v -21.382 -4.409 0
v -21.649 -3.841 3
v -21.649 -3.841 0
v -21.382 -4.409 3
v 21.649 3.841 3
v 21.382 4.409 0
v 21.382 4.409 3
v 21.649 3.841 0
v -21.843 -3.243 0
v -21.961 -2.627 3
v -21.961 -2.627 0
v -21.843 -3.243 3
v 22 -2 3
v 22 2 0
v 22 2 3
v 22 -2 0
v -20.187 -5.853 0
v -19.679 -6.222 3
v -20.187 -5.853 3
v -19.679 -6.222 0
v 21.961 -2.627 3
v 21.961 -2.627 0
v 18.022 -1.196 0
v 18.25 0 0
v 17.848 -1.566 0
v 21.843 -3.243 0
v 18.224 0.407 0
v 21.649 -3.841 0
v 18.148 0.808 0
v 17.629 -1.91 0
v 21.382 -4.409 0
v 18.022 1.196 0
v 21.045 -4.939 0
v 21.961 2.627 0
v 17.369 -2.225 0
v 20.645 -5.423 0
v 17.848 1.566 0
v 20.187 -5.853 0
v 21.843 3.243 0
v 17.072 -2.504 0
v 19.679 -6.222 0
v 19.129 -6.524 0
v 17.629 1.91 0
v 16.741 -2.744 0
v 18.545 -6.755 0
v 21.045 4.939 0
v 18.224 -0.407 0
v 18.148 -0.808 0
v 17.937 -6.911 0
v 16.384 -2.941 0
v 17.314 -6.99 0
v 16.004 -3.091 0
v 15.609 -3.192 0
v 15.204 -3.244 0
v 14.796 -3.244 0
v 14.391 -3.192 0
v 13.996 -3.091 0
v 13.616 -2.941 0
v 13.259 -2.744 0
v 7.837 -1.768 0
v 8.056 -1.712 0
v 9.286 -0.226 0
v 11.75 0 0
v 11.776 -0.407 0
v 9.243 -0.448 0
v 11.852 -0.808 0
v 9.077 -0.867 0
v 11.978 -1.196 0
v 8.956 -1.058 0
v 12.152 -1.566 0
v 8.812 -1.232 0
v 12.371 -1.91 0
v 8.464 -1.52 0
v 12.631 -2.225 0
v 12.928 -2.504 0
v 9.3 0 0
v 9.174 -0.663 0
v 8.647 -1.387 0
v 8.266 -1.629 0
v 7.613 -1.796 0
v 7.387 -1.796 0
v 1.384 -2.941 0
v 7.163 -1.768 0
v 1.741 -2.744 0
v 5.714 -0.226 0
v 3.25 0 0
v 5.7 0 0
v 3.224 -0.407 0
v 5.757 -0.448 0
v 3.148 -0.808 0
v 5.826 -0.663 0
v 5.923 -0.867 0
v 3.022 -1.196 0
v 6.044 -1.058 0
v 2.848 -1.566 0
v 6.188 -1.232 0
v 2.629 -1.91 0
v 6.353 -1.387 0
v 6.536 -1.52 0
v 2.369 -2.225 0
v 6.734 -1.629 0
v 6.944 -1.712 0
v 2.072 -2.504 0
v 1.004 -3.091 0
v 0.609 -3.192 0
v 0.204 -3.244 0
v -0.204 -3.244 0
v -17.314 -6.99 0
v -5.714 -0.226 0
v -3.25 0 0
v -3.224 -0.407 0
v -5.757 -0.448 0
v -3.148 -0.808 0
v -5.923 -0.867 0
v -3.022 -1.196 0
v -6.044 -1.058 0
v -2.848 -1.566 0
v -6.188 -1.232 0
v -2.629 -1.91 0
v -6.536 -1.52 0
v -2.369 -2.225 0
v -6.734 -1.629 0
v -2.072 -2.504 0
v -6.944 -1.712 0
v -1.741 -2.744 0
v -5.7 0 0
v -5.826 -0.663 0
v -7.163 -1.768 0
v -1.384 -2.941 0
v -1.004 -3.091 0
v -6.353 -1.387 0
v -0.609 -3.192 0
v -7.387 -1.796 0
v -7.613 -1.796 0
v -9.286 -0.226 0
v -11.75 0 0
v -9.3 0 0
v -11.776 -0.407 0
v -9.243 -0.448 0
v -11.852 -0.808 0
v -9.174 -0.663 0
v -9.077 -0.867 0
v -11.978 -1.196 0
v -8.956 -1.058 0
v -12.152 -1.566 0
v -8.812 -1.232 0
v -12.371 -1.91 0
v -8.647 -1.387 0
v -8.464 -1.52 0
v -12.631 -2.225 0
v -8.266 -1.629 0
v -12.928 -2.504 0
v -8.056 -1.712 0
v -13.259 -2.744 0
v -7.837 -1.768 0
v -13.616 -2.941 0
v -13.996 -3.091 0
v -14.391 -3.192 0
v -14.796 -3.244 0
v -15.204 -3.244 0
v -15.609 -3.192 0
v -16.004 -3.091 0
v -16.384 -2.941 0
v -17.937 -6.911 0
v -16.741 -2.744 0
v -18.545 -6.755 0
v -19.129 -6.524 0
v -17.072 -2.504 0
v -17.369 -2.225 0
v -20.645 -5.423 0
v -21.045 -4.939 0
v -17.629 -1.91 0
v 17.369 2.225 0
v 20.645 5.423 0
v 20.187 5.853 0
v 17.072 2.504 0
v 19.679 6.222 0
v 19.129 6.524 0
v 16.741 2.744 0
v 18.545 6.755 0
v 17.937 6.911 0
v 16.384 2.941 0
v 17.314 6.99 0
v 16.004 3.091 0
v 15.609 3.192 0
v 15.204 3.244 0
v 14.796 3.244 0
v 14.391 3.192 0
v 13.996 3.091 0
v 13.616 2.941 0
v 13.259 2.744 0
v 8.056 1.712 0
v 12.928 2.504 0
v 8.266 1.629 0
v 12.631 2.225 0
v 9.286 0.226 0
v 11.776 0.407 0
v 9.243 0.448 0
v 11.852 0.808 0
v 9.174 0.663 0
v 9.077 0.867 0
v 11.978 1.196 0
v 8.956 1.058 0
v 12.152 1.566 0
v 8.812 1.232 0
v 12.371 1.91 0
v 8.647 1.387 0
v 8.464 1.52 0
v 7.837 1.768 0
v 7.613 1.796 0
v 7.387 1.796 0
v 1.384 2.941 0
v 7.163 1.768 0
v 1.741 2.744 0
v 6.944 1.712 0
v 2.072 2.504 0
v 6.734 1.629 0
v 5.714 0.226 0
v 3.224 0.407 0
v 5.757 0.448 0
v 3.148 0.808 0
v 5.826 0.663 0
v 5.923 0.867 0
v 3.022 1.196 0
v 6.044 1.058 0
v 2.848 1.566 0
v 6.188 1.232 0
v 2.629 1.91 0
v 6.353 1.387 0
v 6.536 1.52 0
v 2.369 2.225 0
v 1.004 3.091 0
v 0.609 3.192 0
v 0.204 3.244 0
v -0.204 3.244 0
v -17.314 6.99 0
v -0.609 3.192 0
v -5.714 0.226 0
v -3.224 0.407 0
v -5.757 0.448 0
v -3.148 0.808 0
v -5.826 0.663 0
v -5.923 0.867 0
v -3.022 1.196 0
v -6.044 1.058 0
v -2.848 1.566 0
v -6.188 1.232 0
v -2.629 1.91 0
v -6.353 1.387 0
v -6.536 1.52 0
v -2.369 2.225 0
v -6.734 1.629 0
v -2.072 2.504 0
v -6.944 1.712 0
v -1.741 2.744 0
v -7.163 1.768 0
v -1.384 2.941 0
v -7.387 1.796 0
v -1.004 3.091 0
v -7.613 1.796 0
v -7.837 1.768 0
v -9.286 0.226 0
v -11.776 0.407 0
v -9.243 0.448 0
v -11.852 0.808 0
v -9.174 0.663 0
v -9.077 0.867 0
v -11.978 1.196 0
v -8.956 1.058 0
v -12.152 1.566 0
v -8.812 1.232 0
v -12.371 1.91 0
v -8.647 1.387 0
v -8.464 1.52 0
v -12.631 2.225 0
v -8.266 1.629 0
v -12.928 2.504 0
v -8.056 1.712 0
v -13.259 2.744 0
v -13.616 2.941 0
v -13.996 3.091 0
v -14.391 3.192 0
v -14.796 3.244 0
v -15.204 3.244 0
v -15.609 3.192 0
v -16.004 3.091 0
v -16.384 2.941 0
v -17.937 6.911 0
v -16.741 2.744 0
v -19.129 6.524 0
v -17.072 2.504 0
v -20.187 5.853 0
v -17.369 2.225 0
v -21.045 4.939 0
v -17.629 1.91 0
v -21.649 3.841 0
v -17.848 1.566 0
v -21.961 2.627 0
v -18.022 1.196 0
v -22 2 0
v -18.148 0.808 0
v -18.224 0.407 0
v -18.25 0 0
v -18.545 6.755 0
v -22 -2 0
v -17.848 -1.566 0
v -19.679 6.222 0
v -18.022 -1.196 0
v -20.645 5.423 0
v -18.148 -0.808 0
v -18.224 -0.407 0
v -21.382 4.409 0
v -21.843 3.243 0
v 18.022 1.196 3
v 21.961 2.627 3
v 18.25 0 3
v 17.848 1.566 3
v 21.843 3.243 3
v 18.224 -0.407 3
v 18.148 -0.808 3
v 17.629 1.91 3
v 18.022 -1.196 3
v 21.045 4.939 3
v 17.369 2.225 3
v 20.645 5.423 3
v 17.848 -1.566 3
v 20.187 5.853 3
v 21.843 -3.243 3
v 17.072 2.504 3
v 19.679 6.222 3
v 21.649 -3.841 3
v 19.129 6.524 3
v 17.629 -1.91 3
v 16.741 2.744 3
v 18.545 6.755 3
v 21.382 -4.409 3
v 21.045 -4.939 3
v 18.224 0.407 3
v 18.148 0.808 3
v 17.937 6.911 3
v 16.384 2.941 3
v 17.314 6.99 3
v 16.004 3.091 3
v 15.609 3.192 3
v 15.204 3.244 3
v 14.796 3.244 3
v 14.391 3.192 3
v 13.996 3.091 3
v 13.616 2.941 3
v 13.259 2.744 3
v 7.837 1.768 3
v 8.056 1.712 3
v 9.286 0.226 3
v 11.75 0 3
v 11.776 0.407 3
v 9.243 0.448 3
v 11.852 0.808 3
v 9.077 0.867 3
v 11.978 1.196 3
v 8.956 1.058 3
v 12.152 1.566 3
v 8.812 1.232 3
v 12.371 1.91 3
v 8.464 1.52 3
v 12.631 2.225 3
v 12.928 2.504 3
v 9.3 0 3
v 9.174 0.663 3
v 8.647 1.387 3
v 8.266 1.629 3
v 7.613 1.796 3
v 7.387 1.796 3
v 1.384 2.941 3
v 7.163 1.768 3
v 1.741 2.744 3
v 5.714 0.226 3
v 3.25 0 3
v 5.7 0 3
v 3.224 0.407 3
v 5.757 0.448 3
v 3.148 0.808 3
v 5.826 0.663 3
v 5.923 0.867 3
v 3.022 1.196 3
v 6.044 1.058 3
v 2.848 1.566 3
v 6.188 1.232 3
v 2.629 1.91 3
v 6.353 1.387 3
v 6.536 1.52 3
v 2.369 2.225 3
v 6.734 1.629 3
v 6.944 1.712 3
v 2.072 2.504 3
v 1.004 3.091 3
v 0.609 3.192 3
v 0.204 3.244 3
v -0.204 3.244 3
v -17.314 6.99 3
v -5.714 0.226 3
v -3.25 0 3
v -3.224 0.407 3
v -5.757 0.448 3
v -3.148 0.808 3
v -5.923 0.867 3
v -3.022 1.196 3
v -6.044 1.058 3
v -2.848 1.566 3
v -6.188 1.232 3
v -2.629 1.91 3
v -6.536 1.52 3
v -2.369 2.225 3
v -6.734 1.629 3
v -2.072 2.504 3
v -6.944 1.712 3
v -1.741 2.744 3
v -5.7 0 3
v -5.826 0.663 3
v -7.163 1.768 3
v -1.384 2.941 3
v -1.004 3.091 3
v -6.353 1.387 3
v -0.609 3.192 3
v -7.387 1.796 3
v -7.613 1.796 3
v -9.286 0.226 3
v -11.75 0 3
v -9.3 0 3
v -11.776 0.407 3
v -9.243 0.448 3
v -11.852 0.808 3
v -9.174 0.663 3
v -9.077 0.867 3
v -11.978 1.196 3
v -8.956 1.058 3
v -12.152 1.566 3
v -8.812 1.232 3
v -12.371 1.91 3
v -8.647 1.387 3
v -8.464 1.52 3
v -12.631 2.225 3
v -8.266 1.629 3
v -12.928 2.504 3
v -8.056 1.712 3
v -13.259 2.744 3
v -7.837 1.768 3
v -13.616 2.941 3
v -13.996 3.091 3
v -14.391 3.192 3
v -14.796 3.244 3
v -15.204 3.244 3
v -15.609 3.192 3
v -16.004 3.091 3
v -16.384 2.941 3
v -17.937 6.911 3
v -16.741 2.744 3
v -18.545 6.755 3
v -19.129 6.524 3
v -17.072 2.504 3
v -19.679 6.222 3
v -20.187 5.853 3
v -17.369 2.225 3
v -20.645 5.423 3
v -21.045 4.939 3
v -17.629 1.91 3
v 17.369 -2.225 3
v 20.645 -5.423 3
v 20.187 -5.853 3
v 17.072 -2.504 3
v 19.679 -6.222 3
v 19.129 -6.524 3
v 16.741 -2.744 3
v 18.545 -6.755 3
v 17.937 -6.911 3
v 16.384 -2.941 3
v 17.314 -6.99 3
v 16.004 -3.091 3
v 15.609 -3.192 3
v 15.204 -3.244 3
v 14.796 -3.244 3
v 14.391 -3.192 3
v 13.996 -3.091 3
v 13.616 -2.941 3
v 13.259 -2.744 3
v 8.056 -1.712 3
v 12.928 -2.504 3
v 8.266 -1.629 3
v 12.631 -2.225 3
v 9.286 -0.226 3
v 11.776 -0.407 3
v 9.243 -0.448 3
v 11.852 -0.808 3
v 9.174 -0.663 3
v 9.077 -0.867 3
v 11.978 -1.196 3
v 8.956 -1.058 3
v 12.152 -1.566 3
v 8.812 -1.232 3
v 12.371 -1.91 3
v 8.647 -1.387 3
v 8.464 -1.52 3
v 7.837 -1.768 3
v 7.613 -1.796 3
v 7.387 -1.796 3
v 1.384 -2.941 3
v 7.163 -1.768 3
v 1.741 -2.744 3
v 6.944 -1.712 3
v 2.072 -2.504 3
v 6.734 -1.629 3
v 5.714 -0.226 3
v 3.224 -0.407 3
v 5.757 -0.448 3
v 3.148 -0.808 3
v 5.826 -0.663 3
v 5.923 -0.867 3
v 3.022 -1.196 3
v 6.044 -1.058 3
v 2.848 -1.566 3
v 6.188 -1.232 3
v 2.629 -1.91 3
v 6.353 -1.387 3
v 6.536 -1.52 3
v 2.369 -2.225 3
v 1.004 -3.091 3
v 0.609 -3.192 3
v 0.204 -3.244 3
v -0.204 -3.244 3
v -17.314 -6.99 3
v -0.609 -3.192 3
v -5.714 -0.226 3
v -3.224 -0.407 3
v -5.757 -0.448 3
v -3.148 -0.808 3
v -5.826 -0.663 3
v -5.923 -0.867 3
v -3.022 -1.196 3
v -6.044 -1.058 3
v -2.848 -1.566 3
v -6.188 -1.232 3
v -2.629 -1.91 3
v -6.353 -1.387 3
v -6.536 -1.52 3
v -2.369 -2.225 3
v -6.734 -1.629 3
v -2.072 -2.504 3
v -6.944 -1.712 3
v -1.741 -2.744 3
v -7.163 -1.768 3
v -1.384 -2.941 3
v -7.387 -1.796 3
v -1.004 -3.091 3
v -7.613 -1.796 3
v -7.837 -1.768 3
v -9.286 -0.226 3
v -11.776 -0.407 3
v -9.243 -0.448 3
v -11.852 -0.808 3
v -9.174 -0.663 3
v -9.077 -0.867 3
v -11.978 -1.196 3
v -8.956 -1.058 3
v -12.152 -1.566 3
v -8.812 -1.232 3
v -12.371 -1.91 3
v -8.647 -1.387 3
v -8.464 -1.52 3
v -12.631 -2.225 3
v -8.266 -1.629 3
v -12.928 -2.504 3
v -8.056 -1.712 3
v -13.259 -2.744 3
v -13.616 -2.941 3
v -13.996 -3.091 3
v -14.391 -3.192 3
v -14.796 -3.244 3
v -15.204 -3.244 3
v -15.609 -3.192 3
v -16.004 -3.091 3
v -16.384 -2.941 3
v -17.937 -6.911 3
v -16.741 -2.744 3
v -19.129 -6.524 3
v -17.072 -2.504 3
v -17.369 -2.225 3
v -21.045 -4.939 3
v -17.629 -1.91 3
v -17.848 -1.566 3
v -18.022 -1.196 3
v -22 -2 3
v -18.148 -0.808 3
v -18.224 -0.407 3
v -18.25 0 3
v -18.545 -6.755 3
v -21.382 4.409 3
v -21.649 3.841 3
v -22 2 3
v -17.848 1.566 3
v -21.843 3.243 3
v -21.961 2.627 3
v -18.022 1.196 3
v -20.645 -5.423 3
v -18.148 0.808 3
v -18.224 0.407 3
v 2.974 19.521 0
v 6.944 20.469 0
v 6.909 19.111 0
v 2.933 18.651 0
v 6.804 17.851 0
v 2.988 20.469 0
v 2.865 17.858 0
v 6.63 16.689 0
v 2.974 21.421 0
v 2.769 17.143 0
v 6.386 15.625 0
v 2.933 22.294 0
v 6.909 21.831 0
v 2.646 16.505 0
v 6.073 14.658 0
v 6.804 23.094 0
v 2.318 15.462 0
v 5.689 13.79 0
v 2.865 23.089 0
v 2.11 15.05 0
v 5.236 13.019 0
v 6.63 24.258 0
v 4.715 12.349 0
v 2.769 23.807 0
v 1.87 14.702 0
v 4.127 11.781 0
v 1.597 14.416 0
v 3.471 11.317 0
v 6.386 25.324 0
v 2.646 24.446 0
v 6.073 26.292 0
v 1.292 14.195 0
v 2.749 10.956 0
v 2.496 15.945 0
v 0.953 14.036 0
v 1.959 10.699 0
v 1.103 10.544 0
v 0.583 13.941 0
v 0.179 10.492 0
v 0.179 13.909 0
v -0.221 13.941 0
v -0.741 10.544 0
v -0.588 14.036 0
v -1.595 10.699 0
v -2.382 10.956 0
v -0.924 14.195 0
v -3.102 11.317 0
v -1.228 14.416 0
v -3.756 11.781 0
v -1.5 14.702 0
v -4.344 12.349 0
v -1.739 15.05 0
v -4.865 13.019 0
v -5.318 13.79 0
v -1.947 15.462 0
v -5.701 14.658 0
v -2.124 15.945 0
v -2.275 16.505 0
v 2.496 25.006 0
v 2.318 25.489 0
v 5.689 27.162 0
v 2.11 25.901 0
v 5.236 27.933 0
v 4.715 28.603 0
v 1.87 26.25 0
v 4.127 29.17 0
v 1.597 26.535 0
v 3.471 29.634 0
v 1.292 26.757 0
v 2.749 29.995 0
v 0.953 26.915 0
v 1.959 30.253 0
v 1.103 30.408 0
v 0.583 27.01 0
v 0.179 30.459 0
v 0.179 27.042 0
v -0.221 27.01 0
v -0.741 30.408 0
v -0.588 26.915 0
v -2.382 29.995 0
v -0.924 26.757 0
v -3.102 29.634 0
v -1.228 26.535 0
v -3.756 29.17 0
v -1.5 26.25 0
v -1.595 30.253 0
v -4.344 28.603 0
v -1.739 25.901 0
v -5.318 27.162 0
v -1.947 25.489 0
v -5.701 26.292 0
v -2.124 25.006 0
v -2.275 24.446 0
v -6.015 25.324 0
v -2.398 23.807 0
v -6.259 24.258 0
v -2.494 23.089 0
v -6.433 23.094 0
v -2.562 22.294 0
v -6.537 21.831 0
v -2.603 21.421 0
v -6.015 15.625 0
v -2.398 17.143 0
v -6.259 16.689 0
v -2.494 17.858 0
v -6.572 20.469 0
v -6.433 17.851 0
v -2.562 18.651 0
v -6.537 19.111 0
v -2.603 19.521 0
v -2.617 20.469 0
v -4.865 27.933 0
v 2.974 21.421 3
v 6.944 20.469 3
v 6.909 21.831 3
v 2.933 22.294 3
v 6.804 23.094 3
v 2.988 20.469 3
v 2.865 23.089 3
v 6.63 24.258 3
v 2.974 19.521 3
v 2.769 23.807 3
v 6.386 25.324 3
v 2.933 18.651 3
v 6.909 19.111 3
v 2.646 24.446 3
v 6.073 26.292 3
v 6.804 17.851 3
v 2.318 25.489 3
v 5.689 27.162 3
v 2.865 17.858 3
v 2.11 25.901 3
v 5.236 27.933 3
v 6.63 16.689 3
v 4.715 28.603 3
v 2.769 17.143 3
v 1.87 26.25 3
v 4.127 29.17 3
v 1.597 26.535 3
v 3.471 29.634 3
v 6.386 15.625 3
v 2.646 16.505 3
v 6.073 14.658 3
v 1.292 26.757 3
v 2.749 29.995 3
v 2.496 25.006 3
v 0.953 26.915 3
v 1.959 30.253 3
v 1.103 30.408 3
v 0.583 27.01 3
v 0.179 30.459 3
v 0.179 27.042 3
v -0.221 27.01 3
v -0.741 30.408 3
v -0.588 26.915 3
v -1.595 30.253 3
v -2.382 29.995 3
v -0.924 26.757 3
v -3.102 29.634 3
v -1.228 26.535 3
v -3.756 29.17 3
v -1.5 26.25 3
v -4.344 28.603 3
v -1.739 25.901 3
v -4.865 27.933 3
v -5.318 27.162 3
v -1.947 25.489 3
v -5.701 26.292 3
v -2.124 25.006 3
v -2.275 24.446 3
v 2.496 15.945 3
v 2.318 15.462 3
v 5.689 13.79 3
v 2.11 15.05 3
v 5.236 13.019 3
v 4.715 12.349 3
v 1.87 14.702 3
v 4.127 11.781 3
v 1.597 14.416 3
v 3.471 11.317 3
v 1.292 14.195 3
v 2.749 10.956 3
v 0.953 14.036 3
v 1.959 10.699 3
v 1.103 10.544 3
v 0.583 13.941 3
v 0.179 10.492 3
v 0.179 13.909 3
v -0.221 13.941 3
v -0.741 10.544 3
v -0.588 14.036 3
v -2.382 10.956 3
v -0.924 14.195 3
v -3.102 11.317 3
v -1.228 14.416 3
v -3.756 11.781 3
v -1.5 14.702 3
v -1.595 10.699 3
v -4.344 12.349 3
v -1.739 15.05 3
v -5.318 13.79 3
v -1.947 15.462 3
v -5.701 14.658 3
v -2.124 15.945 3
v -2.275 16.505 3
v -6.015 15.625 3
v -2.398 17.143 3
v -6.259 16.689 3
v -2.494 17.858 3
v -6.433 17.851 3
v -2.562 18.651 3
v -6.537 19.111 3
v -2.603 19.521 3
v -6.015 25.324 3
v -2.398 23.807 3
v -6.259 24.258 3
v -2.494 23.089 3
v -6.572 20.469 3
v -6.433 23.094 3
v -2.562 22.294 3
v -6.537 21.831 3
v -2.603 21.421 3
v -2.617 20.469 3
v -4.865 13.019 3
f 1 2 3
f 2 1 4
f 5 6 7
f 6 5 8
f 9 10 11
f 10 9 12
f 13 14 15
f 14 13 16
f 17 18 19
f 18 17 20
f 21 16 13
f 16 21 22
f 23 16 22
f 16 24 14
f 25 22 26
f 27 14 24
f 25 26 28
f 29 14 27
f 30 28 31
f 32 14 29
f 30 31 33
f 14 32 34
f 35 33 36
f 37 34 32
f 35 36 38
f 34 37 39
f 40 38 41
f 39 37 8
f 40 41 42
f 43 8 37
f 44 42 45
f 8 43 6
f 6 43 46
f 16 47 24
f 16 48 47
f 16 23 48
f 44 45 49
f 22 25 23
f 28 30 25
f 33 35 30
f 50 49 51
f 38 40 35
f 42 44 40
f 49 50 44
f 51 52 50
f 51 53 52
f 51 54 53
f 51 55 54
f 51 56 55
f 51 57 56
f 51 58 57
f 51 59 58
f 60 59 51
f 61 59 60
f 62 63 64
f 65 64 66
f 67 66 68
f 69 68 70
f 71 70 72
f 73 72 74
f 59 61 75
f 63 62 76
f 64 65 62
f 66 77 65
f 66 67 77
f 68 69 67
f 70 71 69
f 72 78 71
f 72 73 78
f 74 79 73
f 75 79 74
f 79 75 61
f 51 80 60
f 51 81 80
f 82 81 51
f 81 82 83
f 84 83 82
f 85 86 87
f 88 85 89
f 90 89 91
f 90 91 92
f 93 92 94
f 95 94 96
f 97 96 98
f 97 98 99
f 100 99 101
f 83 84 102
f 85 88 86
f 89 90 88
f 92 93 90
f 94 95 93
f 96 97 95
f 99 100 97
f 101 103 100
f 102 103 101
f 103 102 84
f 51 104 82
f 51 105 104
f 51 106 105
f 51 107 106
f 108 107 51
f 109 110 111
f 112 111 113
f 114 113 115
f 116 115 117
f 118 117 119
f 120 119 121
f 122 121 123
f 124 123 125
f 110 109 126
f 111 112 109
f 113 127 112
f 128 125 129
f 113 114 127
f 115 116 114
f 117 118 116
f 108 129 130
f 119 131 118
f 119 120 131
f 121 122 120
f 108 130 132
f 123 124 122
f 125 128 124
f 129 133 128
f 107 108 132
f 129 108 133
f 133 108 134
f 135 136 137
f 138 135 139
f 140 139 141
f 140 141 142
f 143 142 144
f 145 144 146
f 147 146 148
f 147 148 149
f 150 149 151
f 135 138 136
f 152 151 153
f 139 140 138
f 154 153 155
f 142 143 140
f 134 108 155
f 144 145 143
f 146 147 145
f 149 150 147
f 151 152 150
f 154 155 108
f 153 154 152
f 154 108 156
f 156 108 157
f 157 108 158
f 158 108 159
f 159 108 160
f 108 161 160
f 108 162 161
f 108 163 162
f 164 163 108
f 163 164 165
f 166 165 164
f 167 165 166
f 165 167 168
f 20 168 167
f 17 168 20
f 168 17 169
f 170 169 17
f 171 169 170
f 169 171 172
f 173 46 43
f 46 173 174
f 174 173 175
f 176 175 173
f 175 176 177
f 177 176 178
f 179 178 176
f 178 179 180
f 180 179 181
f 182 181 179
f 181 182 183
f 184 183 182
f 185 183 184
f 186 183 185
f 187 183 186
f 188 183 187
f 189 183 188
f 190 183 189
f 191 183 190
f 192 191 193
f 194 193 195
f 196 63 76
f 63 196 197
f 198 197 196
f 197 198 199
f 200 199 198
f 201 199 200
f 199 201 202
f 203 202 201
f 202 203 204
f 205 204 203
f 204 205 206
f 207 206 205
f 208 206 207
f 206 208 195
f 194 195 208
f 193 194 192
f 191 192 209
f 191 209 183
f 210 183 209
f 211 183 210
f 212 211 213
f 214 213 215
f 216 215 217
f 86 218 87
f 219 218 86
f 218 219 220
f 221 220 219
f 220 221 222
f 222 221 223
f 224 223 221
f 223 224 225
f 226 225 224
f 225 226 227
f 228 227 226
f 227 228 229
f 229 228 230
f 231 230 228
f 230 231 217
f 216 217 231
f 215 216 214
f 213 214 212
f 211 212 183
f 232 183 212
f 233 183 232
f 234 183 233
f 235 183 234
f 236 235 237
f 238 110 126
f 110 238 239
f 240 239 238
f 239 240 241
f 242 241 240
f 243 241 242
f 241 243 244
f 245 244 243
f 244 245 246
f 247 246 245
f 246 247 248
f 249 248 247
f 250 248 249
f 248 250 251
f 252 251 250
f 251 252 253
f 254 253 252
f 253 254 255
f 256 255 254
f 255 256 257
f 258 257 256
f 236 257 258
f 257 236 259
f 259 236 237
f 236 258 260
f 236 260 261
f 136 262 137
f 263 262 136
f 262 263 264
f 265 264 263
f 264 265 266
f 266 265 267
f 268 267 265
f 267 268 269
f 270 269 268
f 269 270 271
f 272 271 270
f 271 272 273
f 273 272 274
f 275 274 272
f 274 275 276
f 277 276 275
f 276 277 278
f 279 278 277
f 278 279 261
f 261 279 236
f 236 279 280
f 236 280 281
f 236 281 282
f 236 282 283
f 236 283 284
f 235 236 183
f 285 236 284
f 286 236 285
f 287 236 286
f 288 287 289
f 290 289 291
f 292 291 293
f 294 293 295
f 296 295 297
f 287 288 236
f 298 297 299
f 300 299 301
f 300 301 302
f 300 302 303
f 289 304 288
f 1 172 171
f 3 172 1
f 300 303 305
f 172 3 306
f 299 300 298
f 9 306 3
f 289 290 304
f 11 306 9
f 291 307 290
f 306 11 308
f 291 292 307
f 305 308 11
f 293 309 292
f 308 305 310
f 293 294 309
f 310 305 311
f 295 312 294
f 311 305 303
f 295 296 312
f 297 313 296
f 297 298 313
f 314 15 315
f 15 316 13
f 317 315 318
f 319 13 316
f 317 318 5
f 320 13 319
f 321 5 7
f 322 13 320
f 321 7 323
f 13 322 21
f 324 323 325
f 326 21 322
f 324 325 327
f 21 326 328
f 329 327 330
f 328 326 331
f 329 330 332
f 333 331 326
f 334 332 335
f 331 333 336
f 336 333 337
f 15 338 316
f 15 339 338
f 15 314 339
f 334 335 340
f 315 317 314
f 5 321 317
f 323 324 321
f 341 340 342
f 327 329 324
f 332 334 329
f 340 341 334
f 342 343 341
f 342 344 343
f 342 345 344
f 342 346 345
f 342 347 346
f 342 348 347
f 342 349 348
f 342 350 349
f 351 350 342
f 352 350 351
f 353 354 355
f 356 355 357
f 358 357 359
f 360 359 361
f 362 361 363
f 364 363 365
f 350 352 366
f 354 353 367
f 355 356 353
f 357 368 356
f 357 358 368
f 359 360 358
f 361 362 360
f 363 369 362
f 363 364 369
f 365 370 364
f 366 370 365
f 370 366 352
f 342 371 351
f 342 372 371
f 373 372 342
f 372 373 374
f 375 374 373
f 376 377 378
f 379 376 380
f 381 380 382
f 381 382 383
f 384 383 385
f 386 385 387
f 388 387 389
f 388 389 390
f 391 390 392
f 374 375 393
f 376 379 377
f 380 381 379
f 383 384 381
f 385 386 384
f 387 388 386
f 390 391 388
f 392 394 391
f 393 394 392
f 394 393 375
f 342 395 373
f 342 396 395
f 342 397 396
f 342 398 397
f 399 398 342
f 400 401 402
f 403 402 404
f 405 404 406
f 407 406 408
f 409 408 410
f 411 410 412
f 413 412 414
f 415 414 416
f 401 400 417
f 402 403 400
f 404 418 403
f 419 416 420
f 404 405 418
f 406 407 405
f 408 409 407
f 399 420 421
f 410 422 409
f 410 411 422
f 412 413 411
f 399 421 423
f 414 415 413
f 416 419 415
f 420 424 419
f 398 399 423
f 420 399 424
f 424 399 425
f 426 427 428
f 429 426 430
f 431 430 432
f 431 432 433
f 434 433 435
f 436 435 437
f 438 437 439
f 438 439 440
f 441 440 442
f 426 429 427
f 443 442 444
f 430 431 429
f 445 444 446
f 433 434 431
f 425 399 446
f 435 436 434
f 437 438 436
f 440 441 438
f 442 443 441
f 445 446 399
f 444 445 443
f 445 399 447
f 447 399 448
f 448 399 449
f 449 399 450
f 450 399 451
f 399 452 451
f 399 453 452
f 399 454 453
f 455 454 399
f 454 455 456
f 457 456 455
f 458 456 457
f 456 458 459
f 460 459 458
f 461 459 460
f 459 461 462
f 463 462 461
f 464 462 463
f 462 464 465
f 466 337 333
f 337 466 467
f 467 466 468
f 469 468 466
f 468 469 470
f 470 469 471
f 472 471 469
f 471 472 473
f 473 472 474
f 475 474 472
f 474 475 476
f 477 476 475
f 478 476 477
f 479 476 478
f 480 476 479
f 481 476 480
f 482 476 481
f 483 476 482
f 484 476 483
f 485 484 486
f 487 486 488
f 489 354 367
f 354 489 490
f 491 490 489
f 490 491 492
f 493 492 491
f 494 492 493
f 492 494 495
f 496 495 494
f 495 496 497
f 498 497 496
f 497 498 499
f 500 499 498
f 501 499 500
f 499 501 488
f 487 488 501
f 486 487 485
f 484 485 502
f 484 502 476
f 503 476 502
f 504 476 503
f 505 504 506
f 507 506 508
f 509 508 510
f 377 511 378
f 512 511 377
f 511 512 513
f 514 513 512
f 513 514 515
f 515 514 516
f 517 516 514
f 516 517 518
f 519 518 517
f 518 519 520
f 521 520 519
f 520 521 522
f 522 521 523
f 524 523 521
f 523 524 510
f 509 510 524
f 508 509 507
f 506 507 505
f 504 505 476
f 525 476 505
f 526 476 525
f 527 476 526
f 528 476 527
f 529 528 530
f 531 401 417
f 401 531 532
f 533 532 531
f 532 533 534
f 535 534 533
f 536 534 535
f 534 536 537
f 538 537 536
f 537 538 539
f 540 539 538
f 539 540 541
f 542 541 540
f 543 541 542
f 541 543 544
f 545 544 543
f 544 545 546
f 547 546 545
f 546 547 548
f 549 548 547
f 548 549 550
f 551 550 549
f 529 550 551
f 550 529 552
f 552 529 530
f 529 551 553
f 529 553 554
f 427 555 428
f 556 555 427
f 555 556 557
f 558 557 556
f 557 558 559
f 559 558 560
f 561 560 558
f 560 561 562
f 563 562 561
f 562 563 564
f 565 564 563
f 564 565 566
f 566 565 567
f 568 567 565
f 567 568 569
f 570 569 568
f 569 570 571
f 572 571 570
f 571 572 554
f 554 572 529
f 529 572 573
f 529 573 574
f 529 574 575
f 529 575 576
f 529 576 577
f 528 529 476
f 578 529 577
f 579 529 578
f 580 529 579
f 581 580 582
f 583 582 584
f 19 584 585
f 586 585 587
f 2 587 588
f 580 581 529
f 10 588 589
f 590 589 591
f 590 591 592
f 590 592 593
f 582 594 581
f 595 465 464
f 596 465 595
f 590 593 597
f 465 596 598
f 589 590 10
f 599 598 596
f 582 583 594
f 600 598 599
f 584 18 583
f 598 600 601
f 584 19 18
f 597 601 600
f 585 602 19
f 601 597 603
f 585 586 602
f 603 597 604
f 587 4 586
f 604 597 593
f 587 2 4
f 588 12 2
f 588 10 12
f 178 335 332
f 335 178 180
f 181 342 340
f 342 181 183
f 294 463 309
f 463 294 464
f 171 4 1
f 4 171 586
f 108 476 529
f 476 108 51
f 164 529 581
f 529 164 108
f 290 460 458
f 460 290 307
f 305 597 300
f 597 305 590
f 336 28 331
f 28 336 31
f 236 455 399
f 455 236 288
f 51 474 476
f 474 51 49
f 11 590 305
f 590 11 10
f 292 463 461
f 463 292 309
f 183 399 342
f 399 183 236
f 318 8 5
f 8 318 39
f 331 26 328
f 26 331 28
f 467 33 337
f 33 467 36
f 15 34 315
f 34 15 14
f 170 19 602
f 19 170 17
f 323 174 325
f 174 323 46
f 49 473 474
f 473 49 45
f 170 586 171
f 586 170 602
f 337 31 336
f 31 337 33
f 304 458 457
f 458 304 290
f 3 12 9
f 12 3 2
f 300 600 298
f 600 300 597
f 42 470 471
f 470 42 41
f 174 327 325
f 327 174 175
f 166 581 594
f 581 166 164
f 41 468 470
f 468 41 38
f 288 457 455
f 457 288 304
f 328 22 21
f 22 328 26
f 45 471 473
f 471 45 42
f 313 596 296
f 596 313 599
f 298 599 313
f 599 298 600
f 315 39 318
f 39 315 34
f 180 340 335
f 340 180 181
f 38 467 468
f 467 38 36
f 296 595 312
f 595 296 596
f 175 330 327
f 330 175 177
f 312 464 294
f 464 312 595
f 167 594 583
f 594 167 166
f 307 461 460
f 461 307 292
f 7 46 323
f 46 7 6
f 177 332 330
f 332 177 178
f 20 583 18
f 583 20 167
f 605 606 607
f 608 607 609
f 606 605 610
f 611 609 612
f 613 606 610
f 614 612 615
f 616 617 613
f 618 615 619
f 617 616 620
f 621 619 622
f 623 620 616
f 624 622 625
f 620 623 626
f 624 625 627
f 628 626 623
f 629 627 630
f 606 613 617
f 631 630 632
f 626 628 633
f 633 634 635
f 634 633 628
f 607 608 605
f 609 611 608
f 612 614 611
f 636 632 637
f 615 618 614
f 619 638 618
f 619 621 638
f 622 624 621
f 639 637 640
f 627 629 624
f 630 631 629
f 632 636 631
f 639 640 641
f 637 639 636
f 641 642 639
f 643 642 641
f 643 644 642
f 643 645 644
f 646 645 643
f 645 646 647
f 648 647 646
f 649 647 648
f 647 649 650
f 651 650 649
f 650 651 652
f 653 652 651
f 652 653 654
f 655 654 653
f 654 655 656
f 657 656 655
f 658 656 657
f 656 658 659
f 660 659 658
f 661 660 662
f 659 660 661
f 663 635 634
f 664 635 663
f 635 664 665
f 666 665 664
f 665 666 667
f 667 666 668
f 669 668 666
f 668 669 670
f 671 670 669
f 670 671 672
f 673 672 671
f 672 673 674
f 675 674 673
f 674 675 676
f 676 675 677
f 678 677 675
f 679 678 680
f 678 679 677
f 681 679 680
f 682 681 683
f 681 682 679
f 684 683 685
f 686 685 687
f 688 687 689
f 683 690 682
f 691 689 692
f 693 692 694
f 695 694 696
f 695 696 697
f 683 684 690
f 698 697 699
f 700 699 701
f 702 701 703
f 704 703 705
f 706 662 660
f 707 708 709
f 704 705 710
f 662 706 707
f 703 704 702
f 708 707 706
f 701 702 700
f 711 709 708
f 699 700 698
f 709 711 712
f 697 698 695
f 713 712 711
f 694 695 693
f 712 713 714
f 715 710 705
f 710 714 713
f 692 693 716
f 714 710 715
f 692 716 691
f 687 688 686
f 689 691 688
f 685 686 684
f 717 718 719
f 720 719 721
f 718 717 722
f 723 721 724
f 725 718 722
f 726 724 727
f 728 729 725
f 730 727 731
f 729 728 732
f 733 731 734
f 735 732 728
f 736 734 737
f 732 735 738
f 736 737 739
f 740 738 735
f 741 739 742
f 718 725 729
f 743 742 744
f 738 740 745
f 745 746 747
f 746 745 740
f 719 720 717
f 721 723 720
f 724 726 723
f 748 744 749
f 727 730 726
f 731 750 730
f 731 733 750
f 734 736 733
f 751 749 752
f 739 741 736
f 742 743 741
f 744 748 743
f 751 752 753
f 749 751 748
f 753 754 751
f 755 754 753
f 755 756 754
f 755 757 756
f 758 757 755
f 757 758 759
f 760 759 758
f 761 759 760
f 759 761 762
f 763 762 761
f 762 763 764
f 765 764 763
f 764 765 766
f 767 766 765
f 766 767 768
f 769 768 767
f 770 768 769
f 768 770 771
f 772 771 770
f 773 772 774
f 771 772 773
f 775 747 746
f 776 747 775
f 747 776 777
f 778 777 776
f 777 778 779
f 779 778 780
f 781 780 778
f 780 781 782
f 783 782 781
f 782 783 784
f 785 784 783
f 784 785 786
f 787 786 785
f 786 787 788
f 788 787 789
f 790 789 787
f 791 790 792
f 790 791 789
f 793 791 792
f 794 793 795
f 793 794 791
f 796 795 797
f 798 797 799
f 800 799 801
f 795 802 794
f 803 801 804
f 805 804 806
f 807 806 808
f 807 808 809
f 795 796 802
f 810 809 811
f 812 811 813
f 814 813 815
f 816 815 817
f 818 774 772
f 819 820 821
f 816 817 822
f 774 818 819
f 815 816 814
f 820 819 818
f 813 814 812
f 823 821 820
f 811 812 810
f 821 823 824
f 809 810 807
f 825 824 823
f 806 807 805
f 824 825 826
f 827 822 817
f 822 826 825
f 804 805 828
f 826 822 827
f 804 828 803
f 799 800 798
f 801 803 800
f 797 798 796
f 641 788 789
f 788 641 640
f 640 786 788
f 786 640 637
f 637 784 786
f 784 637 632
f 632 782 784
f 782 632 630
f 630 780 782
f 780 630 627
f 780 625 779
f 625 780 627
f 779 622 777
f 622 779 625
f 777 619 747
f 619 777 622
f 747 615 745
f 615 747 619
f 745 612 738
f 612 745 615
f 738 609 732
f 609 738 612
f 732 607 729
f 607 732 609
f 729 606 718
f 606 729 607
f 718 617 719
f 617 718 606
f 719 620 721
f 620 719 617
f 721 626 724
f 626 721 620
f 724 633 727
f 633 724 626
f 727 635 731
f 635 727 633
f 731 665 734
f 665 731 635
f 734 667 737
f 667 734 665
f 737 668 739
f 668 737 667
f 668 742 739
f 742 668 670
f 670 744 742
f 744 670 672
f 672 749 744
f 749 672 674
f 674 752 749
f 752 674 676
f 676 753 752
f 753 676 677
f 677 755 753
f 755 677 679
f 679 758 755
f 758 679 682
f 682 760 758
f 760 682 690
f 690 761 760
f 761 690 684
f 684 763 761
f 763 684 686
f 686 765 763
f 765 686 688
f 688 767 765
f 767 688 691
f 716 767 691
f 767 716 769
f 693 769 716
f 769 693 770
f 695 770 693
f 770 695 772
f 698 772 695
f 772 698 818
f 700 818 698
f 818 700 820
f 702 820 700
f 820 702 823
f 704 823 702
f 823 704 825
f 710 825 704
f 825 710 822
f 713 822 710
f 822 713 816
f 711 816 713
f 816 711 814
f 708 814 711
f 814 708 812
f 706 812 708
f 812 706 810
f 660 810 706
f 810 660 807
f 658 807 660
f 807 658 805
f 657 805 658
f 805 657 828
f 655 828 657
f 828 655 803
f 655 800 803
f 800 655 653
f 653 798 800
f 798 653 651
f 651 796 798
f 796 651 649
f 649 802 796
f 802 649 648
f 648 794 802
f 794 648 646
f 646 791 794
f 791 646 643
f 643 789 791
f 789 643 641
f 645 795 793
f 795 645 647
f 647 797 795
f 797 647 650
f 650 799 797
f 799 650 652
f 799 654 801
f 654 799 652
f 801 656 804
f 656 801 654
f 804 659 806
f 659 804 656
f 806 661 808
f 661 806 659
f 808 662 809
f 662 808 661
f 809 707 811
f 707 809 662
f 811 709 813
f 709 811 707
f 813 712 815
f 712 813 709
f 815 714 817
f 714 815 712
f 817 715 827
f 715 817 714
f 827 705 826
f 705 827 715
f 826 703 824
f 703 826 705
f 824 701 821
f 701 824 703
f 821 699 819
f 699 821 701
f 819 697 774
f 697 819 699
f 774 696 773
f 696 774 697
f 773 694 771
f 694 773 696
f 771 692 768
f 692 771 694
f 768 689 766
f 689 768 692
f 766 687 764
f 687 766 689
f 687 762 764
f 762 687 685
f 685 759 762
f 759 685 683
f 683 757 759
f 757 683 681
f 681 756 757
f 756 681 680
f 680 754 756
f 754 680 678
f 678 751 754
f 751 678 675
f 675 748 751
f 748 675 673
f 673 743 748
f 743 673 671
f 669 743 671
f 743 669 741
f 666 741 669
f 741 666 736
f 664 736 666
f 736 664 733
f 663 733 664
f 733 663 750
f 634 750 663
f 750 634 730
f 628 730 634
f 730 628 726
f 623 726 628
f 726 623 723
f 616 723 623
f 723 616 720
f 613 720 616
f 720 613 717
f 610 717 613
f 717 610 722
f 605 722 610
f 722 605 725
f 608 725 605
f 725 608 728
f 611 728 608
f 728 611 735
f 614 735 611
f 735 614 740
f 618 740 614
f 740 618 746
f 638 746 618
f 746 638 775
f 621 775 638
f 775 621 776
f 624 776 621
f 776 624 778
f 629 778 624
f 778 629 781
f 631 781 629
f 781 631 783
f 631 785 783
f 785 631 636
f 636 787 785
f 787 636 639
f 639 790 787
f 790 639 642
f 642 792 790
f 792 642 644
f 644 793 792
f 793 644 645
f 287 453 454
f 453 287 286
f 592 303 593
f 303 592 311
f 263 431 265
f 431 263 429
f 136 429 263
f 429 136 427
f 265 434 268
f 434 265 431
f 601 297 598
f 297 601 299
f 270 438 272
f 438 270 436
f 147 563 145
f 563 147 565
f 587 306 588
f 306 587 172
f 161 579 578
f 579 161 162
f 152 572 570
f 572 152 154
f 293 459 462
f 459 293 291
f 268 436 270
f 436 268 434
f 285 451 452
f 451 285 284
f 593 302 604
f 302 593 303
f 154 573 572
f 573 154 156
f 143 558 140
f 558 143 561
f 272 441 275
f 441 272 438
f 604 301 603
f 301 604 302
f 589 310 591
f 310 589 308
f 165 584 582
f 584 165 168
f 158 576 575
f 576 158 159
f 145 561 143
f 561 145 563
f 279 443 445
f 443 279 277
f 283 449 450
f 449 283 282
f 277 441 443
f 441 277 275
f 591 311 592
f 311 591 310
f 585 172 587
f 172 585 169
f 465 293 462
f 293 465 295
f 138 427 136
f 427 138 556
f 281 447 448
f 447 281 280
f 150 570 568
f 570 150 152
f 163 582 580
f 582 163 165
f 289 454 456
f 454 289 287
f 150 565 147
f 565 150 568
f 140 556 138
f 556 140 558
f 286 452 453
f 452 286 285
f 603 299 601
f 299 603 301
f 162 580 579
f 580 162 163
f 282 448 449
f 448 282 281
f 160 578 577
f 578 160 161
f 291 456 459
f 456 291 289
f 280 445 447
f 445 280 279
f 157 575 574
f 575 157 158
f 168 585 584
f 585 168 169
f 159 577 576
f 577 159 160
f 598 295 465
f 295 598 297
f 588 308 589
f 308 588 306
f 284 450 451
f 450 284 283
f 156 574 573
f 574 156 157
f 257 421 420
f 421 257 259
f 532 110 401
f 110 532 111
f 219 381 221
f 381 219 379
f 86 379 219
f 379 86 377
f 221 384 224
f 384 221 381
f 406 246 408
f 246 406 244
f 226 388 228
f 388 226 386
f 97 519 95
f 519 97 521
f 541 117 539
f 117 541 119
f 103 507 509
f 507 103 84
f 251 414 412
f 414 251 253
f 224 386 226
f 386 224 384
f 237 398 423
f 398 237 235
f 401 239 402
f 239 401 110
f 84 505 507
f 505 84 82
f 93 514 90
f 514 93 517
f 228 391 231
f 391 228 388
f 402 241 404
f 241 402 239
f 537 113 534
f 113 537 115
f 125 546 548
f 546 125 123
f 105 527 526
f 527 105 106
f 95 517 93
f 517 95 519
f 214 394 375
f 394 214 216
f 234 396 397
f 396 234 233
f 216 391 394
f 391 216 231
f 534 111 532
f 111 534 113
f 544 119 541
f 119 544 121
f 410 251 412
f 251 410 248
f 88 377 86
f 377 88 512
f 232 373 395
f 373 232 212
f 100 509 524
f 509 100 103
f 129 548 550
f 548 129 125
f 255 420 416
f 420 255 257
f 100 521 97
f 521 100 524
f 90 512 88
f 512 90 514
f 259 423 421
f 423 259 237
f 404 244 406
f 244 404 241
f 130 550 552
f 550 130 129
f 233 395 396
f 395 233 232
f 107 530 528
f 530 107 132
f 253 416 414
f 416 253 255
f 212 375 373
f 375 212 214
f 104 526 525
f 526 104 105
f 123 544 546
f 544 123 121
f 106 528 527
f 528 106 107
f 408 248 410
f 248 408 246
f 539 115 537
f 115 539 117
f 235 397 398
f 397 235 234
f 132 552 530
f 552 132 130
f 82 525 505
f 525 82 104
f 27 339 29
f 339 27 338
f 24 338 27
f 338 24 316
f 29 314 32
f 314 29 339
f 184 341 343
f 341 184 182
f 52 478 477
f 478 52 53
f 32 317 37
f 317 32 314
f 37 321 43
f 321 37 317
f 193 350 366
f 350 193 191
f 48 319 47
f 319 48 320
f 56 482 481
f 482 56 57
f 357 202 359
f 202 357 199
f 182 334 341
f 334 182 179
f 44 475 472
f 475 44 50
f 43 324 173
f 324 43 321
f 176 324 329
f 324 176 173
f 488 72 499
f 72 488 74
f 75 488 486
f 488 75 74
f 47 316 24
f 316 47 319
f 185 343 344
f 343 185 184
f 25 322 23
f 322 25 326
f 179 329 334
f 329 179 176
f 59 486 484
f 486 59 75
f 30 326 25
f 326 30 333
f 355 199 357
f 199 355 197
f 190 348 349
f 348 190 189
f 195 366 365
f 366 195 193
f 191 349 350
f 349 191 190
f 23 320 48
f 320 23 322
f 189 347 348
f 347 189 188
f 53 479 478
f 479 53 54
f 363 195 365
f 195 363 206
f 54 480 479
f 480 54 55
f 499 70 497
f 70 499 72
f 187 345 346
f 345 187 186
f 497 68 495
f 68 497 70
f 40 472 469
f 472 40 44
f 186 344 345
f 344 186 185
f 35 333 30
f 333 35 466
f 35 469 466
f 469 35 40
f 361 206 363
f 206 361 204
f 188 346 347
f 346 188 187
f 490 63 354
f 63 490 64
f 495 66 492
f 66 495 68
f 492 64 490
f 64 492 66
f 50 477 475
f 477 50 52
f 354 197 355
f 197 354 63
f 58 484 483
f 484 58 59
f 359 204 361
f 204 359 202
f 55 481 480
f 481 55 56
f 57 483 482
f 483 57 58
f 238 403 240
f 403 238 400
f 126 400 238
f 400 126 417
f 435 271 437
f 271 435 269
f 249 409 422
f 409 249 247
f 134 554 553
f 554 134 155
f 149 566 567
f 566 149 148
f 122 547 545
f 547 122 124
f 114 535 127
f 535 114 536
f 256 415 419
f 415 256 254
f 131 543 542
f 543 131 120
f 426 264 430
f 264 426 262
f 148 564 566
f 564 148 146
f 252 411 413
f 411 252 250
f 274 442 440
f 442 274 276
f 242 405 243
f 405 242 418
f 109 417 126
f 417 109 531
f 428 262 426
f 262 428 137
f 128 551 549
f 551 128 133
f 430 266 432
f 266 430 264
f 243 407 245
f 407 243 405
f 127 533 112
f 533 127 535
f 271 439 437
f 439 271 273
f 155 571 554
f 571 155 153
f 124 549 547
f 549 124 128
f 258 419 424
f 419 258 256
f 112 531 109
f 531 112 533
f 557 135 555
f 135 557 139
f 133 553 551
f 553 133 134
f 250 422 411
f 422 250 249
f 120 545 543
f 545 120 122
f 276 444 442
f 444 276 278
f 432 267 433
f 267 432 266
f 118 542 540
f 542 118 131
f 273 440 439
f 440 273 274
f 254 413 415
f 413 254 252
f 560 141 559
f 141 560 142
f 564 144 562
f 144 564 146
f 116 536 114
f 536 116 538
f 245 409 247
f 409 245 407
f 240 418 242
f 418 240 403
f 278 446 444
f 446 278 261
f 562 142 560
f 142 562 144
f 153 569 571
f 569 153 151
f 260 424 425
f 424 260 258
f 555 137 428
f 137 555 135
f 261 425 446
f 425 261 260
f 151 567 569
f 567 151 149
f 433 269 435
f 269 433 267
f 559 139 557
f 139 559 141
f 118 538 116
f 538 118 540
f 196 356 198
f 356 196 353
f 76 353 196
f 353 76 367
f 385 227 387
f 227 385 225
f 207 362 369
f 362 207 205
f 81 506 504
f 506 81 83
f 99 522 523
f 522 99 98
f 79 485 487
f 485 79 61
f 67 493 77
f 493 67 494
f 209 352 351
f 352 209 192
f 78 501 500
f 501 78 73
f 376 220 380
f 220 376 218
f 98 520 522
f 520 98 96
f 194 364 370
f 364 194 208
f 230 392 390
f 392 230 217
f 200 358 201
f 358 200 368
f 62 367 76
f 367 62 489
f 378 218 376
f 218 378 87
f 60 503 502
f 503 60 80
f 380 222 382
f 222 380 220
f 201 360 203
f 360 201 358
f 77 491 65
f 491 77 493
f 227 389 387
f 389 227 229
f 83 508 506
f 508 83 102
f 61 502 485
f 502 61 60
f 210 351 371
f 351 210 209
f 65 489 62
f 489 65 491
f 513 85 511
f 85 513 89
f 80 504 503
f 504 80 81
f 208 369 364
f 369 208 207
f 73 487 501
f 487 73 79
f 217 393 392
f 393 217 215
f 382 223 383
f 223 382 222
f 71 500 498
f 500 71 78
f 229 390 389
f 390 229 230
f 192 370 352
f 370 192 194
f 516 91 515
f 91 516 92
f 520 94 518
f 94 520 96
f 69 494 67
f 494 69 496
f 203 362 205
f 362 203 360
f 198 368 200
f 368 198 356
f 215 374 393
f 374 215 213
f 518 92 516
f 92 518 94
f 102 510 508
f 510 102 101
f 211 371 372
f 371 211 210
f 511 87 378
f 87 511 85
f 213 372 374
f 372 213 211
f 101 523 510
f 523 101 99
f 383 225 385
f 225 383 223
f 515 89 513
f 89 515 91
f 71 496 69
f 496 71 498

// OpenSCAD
$fn = 50;


difference() {
	union() {
		hull() {
			translate(v = [-17.0000000000, 2.0000000000, 0]) {
				cylinder(h = 3, r = 5);
			}
			translate(v = [17.0000000000, 2.0000000000, 0]) {
				cylinder(h = 3, r = 5);
			}
			translate(v = [-17.0000000000, -2.0000000000, 0]) {
				cylinder(h = 3, r = 5);
			}
			translate(v = [17.0000000000, -2.0000000000, 0]) {
				cylinder(h = 3, r = 5);
			}
		}
		translate(v = [0, 30.0000000000, 0]) {
			linear_extrude(height = 3) {
				text(font = "DejaVu Sans Mono:style=Bold", halign = "center", size = 19.0000000000, text = "O", valign = "top");
			}
		}
	}
	union() {
		translate(v = [-15.0000000000, 0.0000000000, 0]) {
			translate(v = [0, 0, -100]) {
				cylinder(h = 200, r = 3.2500000000);
			}
		}
		translate(v = [0, 0, -100]) {
			cylinder(h = 200, r = 3.2500000000);
		}
		translate(v = [15.0000000000, 0.0000000000, 0]) {
			translate(v = [0, 0, -100]) {
				cylinder(h = 200, r = 3.2500000000);
			}
		}
		translate(v = [-15.0000000000, 0.0000000000, 0]) {
			translate(v = [0, 0, -100]) {
				cylinder(h = 200, r = 1.8000000000);
			}
		}
		translate(v = [-7.5000000000, 0.0000000000, 0]) {
			translate(v = [0, 0, -100]) {
				cylinder(h = 200, r = 1.8000000000);
			}
		}
		translate(v = [0, 0, -100]) {
			cylinder(h = 200, r = 1.8000000000);
		}
		translate(v = [7.5000000000, 0.0000000000, 0]) {
			translate(v = [0, 0, -100]) {
				cylinder(h = 200, r = 1.8000000000);
			}
		}
		translate(v = [15.0000000000, 0.0000000000, 0]) {
			translate(v = [0, 0, -100]) {
				cylinder(h = 200, r = 1.8000000000);
			}
		}
	}
}
